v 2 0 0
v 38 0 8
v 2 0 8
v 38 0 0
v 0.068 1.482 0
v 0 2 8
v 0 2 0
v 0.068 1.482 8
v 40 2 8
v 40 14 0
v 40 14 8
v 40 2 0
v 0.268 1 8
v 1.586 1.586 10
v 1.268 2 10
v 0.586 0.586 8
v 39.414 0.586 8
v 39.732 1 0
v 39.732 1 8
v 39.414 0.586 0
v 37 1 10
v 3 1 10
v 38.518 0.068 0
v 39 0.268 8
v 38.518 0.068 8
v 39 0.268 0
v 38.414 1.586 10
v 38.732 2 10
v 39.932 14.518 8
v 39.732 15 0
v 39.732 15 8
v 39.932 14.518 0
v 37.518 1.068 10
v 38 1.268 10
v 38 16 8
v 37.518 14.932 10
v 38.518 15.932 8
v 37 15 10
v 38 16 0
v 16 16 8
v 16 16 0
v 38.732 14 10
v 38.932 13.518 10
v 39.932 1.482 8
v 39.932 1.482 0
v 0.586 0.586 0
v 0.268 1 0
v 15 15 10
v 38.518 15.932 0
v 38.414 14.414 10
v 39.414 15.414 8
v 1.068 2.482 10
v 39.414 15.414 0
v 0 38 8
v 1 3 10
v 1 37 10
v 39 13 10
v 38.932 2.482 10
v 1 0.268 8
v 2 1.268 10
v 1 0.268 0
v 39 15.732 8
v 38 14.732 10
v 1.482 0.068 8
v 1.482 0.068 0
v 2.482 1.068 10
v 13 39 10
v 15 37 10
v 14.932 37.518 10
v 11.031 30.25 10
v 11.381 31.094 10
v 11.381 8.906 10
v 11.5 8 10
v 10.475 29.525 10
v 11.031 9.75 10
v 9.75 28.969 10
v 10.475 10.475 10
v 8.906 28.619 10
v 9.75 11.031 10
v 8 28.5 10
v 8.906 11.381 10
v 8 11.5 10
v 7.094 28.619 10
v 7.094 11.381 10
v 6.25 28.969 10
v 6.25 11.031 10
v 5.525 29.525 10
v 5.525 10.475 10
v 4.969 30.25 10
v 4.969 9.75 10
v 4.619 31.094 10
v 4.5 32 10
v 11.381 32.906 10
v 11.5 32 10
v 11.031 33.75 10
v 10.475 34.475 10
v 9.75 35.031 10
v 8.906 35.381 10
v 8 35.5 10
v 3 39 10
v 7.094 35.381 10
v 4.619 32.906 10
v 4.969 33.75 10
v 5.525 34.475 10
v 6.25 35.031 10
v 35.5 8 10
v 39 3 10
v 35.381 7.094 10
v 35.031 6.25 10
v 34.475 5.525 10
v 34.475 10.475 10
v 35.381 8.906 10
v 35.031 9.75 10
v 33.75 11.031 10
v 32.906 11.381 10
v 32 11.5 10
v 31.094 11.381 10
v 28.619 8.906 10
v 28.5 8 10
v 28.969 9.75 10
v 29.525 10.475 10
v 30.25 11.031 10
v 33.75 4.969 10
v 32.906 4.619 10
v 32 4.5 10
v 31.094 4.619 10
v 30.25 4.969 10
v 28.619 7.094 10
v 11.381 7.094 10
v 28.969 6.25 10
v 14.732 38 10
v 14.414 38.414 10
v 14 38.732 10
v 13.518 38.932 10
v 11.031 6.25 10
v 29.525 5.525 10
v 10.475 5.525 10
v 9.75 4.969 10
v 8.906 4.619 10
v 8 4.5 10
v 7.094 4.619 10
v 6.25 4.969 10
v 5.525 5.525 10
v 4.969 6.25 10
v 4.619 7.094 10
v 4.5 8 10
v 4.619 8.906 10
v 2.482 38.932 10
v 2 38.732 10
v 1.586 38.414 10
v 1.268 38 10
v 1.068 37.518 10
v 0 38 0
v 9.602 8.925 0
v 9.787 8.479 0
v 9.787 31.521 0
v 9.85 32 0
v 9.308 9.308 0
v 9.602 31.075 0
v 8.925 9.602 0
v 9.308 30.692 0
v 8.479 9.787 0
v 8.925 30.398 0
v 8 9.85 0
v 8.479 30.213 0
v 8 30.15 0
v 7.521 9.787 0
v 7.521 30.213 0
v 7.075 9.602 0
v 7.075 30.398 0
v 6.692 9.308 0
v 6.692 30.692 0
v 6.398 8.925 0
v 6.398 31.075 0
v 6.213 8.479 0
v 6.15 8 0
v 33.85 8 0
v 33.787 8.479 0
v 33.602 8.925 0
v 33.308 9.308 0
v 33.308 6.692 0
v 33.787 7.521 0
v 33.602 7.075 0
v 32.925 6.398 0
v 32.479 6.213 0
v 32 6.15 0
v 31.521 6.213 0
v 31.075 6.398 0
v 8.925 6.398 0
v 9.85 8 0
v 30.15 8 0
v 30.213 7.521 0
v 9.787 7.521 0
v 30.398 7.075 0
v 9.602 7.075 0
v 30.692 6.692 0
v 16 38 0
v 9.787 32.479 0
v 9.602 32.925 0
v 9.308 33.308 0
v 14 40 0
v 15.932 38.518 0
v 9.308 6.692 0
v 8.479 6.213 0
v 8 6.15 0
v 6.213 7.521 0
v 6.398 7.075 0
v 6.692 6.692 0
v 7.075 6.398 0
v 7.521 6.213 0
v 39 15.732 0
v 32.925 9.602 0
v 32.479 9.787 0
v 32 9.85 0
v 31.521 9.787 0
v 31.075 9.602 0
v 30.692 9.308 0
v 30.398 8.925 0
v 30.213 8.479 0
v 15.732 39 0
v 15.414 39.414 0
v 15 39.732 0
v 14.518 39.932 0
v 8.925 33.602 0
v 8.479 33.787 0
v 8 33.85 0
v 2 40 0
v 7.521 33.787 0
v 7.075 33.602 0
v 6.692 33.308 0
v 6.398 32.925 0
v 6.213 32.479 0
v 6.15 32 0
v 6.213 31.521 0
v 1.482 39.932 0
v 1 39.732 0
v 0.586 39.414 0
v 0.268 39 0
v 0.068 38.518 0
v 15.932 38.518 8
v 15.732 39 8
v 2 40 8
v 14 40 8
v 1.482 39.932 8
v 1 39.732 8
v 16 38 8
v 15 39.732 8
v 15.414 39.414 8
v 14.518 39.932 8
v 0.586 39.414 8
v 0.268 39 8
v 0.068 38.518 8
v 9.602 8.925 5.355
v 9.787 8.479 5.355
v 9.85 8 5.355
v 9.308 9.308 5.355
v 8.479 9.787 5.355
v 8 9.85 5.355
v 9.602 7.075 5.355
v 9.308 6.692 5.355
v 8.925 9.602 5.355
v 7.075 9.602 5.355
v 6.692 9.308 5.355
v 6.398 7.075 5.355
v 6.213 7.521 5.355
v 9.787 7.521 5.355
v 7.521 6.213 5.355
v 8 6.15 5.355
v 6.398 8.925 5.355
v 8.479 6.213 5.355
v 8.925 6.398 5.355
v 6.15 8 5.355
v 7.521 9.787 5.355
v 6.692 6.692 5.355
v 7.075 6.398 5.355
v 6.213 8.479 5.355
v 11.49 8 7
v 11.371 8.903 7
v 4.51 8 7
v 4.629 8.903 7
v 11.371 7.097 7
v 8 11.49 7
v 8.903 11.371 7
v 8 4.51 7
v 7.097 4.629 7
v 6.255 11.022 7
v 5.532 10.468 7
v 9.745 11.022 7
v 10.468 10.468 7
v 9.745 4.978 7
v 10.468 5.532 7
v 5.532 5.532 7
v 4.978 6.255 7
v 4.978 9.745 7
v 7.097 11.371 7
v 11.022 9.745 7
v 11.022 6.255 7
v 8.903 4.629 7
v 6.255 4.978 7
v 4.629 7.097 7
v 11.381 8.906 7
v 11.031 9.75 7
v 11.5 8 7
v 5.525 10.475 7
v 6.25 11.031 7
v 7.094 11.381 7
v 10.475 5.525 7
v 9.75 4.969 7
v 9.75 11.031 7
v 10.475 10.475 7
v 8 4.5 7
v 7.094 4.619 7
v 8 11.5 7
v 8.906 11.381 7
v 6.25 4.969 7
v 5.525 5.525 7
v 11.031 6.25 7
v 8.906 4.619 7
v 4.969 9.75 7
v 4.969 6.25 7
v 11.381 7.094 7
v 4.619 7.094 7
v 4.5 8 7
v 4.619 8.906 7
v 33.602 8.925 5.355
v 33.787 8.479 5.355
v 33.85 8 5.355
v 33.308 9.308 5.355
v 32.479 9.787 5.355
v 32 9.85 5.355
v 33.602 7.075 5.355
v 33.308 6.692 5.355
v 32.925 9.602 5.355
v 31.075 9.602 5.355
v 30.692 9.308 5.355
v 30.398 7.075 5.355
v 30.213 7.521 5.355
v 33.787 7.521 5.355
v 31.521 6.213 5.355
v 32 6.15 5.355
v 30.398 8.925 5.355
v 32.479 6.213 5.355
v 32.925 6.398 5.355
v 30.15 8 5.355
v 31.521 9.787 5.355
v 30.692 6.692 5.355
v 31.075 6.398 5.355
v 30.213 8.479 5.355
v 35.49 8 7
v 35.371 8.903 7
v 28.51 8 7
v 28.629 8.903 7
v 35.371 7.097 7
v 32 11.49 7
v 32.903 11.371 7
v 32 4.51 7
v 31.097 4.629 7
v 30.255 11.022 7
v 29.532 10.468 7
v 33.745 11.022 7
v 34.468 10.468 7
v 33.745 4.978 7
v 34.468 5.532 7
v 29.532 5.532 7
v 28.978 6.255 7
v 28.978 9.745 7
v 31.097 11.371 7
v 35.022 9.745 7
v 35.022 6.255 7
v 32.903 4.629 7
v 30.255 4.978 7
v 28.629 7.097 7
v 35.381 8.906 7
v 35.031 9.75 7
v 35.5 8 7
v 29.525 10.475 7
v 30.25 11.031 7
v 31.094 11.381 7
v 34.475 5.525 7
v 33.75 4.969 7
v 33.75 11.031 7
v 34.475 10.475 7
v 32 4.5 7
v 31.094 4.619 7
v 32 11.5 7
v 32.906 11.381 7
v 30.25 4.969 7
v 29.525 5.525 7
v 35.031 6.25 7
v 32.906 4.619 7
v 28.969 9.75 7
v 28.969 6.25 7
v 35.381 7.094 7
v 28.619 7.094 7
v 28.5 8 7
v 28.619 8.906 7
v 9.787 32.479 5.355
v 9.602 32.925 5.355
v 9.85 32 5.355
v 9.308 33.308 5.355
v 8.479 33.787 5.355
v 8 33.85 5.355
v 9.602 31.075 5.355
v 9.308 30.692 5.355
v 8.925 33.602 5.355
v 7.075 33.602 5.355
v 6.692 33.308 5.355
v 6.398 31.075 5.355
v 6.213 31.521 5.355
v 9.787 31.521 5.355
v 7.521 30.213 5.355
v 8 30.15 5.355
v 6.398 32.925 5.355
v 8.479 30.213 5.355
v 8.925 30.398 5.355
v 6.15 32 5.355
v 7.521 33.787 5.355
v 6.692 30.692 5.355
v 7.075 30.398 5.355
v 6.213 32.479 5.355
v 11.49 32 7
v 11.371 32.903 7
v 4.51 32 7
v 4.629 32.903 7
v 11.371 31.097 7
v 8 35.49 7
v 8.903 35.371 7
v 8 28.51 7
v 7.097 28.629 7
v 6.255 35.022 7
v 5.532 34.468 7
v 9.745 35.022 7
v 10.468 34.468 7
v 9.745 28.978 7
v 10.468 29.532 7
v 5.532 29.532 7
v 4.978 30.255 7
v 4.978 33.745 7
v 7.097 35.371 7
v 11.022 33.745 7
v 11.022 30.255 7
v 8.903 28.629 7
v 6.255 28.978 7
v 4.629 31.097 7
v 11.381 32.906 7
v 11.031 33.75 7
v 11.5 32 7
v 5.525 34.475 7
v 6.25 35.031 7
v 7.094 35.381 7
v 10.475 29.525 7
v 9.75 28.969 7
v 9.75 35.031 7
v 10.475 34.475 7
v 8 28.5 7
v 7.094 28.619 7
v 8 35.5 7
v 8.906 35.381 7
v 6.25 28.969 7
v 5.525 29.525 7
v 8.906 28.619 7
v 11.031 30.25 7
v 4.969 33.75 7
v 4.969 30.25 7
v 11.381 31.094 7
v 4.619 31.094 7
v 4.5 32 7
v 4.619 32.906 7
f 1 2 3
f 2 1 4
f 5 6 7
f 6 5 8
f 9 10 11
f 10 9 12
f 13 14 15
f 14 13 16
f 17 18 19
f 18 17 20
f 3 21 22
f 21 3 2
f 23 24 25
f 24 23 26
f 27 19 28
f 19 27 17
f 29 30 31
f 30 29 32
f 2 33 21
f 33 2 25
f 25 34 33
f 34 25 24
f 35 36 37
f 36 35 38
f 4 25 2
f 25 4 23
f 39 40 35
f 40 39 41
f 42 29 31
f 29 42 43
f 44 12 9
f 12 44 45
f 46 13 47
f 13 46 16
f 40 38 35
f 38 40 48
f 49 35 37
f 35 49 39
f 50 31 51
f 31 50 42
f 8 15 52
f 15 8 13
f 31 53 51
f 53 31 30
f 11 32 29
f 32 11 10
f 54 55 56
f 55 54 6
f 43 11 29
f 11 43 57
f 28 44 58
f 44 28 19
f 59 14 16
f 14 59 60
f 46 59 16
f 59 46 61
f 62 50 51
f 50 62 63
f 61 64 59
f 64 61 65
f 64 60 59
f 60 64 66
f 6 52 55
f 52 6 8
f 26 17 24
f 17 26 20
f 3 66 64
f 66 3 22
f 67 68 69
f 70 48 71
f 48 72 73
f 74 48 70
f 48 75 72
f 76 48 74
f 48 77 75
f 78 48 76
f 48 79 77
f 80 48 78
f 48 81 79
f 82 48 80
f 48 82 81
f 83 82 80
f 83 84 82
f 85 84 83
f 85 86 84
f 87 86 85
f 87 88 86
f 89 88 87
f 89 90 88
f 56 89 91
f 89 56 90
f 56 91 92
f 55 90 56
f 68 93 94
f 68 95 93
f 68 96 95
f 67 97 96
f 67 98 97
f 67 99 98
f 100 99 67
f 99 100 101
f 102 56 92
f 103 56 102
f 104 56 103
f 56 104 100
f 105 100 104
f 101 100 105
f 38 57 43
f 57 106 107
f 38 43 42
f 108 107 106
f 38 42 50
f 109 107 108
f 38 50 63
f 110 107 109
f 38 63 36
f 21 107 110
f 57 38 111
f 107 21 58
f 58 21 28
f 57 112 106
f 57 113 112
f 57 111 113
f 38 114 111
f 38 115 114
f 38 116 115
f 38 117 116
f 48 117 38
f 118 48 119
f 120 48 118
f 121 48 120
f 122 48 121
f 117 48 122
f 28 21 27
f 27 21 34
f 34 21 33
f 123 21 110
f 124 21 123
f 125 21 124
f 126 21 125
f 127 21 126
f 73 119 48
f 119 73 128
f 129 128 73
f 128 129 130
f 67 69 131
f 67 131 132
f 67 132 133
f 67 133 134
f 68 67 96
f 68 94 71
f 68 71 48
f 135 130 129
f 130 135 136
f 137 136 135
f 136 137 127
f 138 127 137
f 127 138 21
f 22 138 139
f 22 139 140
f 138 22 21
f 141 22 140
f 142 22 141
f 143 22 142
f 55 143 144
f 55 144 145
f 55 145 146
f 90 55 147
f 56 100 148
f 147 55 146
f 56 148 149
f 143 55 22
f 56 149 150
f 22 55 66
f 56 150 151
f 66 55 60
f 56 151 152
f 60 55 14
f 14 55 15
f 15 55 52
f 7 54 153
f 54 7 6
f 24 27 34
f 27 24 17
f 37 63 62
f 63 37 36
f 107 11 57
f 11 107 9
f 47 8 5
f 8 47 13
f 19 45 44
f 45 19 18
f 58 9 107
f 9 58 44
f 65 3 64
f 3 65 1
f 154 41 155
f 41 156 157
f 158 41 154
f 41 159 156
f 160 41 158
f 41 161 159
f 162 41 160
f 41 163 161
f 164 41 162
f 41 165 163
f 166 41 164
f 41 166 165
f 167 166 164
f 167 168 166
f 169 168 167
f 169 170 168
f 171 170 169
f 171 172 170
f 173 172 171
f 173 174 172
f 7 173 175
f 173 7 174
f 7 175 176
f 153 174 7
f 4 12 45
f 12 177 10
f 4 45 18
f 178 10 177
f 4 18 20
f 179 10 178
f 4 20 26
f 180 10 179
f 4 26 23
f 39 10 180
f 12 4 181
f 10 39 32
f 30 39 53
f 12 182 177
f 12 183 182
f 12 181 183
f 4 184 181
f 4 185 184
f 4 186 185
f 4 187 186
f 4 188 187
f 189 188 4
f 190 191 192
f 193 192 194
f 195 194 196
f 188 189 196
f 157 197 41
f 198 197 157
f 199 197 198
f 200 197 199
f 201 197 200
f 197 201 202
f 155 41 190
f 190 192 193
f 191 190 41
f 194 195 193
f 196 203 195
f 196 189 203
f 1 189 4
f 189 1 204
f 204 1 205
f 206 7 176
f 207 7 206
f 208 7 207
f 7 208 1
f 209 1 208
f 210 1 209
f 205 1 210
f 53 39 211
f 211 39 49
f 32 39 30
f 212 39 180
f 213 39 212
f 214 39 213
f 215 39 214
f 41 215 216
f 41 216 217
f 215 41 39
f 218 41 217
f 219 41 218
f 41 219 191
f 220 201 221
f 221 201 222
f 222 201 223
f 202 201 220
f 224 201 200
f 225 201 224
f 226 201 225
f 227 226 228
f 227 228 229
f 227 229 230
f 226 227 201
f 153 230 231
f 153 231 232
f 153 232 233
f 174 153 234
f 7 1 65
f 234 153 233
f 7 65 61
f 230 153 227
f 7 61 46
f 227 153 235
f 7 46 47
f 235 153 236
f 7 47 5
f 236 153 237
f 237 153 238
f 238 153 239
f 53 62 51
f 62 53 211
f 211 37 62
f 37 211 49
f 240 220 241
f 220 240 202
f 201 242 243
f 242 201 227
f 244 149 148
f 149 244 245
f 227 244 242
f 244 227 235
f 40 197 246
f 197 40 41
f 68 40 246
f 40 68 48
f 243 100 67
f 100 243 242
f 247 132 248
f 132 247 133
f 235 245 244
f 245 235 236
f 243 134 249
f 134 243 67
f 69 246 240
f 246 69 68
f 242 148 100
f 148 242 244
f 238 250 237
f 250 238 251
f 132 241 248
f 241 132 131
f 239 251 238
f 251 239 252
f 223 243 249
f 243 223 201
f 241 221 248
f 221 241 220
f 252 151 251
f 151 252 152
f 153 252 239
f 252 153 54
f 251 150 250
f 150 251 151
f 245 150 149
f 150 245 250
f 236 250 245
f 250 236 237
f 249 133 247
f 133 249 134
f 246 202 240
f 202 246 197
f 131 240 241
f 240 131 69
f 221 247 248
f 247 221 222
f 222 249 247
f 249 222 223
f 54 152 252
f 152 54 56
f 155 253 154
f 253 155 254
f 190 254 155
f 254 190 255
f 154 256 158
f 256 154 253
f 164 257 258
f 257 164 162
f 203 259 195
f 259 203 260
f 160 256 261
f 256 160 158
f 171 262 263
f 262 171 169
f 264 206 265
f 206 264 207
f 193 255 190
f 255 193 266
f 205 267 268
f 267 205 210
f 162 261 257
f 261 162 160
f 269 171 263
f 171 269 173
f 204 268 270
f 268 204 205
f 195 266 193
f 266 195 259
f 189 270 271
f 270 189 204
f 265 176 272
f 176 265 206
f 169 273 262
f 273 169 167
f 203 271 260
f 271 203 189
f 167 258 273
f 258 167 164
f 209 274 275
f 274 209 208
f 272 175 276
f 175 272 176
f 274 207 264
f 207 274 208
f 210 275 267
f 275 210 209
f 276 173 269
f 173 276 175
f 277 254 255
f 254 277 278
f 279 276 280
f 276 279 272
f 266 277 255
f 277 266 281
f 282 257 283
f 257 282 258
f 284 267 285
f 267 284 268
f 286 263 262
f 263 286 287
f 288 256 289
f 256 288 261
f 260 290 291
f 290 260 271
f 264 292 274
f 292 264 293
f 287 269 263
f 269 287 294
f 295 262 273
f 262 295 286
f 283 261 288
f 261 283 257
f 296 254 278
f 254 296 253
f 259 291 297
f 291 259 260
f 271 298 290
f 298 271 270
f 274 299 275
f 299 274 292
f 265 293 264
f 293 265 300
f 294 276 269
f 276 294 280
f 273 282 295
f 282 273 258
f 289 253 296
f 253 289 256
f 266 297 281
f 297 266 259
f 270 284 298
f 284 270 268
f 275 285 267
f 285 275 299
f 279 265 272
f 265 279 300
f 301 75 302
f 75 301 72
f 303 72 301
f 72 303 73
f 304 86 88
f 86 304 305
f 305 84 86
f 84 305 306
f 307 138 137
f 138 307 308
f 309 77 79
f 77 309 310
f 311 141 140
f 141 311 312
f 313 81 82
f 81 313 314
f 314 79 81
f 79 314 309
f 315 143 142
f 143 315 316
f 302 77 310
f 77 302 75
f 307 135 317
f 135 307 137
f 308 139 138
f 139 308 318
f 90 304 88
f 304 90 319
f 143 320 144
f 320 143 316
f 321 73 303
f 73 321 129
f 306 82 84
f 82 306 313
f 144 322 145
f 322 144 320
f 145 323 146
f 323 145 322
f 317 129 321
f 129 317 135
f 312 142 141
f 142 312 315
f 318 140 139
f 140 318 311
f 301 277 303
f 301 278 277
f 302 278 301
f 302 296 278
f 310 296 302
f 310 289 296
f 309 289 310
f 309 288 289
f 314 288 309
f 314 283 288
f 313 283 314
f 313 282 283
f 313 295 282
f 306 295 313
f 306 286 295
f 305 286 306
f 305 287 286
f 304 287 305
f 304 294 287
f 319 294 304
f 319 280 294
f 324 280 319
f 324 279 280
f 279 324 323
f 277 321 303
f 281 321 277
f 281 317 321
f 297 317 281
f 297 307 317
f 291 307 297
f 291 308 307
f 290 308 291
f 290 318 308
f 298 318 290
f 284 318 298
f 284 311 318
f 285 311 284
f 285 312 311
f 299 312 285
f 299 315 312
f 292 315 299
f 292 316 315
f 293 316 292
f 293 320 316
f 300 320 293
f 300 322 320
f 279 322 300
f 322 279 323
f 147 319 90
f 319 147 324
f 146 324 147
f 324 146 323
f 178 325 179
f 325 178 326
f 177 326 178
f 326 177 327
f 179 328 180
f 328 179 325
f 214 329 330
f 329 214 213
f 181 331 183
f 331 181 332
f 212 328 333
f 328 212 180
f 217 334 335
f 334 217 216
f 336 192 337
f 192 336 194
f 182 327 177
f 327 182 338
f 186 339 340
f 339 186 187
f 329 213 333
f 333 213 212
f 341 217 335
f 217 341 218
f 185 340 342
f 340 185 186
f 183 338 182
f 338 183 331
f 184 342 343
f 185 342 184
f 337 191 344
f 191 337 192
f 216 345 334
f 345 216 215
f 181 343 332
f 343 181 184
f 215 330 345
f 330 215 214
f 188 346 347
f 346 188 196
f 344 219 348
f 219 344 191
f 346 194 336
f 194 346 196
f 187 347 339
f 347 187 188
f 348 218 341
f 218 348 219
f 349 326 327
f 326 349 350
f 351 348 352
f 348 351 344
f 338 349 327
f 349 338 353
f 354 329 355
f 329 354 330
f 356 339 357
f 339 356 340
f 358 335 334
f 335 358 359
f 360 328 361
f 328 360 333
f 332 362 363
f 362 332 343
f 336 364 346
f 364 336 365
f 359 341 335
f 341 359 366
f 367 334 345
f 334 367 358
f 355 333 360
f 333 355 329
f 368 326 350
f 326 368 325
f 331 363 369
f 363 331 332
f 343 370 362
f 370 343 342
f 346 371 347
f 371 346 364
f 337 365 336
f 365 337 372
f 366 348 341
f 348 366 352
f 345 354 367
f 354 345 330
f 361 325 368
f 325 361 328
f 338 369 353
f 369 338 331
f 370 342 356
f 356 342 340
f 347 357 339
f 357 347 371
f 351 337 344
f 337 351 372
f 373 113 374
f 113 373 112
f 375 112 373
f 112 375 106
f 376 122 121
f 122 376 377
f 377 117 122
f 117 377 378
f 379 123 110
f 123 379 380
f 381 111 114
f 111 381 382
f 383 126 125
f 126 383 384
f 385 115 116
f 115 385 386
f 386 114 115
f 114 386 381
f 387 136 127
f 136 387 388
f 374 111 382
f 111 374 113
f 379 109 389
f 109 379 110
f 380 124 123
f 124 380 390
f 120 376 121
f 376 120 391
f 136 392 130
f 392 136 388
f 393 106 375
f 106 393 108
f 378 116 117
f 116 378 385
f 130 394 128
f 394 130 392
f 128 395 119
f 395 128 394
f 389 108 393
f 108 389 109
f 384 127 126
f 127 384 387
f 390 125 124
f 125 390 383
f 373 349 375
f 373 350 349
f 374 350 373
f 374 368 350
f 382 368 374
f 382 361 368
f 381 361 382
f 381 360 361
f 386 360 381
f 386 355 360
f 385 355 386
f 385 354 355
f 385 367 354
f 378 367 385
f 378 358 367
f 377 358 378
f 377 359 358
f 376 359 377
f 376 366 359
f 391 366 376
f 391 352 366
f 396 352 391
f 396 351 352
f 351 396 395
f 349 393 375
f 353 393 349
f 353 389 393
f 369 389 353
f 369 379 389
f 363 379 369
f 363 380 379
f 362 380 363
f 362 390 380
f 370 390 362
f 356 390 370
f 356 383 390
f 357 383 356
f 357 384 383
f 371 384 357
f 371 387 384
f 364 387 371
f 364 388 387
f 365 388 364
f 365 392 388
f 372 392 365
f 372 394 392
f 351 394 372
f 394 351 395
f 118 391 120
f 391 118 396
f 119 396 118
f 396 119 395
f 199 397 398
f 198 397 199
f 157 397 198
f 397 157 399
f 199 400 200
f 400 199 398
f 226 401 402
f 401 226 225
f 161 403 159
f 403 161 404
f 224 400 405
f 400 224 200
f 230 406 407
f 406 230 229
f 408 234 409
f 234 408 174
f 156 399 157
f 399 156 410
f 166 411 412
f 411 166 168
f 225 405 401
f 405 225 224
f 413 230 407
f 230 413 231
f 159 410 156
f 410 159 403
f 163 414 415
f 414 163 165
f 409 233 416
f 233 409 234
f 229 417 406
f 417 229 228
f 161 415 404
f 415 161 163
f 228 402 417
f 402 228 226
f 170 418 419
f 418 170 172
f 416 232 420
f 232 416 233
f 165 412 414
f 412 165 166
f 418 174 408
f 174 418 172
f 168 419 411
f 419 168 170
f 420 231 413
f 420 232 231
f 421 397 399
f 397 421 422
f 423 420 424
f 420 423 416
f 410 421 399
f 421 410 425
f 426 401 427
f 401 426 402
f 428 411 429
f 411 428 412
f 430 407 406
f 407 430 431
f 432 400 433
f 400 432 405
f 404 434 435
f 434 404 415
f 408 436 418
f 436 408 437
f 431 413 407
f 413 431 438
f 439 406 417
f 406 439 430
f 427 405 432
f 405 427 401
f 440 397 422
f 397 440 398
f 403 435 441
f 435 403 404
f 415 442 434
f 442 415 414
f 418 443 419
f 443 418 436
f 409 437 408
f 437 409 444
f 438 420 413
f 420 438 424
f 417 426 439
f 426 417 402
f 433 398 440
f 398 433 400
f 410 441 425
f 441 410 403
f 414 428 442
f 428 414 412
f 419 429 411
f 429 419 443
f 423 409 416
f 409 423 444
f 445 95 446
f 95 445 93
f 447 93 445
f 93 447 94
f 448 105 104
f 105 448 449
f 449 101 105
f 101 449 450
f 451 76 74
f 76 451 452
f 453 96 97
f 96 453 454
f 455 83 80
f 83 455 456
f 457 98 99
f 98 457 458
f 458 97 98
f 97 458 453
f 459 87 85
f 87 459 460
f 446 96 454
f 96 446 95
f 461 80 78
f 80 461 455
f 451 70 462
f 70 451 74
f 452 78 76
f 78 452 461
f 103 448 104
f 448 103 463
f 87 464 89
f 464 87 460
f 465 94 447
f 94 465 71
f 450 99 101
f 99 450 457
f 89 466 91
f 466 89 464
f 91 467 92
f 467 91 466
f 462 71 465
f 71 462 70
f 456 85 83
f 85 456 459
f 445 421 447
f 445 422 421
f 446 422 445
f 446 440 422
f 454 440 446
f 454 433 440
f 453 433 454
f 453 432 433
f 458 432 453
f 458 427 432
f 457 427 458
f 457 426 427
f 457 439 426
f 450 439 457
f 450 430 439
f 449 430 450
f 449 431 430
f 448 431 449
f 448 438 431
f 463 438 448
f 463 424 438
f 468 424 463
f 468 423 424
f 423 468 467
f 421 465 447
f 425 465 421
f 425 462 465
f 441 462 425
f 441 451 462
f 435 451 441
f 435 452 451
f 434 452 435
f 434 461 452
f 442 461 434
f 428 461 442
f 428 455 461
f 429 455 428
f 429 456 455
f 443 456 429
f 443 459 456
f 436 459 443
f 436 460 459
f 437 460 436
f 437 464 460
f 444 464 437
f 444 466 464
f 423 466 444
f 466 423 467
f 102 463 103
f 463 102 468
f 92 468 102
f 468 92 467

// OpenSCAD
FFF=[false,false,false];FFT=[false,false,true];
FTF=[false,true,false];FTT=[false,true,true];
TFF=[true,false,false];TFT=[true,false,true];
TTF=[true,true,false];TTT=[true,true,true];
module cube2(size, center) {
  translate([
    center[0] ? -size[0]/2 : 0,
    center[1] ? -size[1]/2 : 0,
    center[2] ? -size[2]/2 : 0]) cube(size);
}
module mirror_x() {
  for(a=[0,1])mirror([a,0,0])children();
}
module mirror_y() {
  for(a=[0,1])mirror([0,a,0])children();
}
module mirror_z() {
  for(a=[0,1])mirror([0,0,a])children();
}

module corner_bracket() {
  difference() {
    union() {
      hull() {
        for(xy=[[2,2],[38,2],[2,38],[38,10],[10,38]])
          translate(xy)cylinder(r=2,h=5,$fn=24);
        translate([20,20,30])cube2([2,2,2],TTT);
      }
    }
    translate([0,0,8])cube2([100,100,100],TTF);
    for(xy=[[8,8],[32,8],[8,32]])translate(xy) {
      cylinder(d=3.7,h=30,center=true,$fn=24);
      translate([0,0,3.5])cylinder(d1=0,d2=7,h=3.51,$fn=24);
      translate([0,0,7])cylinder(d=7,h=10,$fn=24);
    }
  }
}
module inner_corner_bracket() {
  difference() {
    union() {
      for(a=[0,1])mirror([a,-a])
      hull() {
        for(xy=[[2,2],[38,2],[38,14],[2,14]])
          translate(xy)cylinder(r=2,h=8,$fn=24);
        for(xy=[[3,3],[37,3],[37,13],[3,13]])
          translate(xy)cylinder(r=2,h=10,$fn=24);
      }
    }
    for(xy=[[8,8],[32,8],[8,32]])translate(xy) {
      cylinder(d=3.7,h=30,center=true,$fn=24);
      translate([0,0,3.5])cylinder(d1=0,d2=7,h=3.51,$fn=24);
      translate([0,0,7])cylinder(d=7,h=10,$fn=24);
    }
  }
}

module circle_bumper() {
  difference() {
    union() {
      hull() {
        cylinder(d=20,h=8,$fn=72);
        translate([0,0,30])cylinder(d=1,h=1);
      }
    }
    translate([0,0,10])cube2([100,100,100],TTF);
    {
      cylinder(d=3.7,h=30,center=true,$fn=24);
      translate([0,0,3.5])cylinder(d1=0,d2=7,h=3.51,$fn=24);
      translate([0,0,7])cylinder(d=7,h=10,$fn=24);
    }
  }
}
//corner_bracket();
//circle_bumper();
inner_corner_bracket();
